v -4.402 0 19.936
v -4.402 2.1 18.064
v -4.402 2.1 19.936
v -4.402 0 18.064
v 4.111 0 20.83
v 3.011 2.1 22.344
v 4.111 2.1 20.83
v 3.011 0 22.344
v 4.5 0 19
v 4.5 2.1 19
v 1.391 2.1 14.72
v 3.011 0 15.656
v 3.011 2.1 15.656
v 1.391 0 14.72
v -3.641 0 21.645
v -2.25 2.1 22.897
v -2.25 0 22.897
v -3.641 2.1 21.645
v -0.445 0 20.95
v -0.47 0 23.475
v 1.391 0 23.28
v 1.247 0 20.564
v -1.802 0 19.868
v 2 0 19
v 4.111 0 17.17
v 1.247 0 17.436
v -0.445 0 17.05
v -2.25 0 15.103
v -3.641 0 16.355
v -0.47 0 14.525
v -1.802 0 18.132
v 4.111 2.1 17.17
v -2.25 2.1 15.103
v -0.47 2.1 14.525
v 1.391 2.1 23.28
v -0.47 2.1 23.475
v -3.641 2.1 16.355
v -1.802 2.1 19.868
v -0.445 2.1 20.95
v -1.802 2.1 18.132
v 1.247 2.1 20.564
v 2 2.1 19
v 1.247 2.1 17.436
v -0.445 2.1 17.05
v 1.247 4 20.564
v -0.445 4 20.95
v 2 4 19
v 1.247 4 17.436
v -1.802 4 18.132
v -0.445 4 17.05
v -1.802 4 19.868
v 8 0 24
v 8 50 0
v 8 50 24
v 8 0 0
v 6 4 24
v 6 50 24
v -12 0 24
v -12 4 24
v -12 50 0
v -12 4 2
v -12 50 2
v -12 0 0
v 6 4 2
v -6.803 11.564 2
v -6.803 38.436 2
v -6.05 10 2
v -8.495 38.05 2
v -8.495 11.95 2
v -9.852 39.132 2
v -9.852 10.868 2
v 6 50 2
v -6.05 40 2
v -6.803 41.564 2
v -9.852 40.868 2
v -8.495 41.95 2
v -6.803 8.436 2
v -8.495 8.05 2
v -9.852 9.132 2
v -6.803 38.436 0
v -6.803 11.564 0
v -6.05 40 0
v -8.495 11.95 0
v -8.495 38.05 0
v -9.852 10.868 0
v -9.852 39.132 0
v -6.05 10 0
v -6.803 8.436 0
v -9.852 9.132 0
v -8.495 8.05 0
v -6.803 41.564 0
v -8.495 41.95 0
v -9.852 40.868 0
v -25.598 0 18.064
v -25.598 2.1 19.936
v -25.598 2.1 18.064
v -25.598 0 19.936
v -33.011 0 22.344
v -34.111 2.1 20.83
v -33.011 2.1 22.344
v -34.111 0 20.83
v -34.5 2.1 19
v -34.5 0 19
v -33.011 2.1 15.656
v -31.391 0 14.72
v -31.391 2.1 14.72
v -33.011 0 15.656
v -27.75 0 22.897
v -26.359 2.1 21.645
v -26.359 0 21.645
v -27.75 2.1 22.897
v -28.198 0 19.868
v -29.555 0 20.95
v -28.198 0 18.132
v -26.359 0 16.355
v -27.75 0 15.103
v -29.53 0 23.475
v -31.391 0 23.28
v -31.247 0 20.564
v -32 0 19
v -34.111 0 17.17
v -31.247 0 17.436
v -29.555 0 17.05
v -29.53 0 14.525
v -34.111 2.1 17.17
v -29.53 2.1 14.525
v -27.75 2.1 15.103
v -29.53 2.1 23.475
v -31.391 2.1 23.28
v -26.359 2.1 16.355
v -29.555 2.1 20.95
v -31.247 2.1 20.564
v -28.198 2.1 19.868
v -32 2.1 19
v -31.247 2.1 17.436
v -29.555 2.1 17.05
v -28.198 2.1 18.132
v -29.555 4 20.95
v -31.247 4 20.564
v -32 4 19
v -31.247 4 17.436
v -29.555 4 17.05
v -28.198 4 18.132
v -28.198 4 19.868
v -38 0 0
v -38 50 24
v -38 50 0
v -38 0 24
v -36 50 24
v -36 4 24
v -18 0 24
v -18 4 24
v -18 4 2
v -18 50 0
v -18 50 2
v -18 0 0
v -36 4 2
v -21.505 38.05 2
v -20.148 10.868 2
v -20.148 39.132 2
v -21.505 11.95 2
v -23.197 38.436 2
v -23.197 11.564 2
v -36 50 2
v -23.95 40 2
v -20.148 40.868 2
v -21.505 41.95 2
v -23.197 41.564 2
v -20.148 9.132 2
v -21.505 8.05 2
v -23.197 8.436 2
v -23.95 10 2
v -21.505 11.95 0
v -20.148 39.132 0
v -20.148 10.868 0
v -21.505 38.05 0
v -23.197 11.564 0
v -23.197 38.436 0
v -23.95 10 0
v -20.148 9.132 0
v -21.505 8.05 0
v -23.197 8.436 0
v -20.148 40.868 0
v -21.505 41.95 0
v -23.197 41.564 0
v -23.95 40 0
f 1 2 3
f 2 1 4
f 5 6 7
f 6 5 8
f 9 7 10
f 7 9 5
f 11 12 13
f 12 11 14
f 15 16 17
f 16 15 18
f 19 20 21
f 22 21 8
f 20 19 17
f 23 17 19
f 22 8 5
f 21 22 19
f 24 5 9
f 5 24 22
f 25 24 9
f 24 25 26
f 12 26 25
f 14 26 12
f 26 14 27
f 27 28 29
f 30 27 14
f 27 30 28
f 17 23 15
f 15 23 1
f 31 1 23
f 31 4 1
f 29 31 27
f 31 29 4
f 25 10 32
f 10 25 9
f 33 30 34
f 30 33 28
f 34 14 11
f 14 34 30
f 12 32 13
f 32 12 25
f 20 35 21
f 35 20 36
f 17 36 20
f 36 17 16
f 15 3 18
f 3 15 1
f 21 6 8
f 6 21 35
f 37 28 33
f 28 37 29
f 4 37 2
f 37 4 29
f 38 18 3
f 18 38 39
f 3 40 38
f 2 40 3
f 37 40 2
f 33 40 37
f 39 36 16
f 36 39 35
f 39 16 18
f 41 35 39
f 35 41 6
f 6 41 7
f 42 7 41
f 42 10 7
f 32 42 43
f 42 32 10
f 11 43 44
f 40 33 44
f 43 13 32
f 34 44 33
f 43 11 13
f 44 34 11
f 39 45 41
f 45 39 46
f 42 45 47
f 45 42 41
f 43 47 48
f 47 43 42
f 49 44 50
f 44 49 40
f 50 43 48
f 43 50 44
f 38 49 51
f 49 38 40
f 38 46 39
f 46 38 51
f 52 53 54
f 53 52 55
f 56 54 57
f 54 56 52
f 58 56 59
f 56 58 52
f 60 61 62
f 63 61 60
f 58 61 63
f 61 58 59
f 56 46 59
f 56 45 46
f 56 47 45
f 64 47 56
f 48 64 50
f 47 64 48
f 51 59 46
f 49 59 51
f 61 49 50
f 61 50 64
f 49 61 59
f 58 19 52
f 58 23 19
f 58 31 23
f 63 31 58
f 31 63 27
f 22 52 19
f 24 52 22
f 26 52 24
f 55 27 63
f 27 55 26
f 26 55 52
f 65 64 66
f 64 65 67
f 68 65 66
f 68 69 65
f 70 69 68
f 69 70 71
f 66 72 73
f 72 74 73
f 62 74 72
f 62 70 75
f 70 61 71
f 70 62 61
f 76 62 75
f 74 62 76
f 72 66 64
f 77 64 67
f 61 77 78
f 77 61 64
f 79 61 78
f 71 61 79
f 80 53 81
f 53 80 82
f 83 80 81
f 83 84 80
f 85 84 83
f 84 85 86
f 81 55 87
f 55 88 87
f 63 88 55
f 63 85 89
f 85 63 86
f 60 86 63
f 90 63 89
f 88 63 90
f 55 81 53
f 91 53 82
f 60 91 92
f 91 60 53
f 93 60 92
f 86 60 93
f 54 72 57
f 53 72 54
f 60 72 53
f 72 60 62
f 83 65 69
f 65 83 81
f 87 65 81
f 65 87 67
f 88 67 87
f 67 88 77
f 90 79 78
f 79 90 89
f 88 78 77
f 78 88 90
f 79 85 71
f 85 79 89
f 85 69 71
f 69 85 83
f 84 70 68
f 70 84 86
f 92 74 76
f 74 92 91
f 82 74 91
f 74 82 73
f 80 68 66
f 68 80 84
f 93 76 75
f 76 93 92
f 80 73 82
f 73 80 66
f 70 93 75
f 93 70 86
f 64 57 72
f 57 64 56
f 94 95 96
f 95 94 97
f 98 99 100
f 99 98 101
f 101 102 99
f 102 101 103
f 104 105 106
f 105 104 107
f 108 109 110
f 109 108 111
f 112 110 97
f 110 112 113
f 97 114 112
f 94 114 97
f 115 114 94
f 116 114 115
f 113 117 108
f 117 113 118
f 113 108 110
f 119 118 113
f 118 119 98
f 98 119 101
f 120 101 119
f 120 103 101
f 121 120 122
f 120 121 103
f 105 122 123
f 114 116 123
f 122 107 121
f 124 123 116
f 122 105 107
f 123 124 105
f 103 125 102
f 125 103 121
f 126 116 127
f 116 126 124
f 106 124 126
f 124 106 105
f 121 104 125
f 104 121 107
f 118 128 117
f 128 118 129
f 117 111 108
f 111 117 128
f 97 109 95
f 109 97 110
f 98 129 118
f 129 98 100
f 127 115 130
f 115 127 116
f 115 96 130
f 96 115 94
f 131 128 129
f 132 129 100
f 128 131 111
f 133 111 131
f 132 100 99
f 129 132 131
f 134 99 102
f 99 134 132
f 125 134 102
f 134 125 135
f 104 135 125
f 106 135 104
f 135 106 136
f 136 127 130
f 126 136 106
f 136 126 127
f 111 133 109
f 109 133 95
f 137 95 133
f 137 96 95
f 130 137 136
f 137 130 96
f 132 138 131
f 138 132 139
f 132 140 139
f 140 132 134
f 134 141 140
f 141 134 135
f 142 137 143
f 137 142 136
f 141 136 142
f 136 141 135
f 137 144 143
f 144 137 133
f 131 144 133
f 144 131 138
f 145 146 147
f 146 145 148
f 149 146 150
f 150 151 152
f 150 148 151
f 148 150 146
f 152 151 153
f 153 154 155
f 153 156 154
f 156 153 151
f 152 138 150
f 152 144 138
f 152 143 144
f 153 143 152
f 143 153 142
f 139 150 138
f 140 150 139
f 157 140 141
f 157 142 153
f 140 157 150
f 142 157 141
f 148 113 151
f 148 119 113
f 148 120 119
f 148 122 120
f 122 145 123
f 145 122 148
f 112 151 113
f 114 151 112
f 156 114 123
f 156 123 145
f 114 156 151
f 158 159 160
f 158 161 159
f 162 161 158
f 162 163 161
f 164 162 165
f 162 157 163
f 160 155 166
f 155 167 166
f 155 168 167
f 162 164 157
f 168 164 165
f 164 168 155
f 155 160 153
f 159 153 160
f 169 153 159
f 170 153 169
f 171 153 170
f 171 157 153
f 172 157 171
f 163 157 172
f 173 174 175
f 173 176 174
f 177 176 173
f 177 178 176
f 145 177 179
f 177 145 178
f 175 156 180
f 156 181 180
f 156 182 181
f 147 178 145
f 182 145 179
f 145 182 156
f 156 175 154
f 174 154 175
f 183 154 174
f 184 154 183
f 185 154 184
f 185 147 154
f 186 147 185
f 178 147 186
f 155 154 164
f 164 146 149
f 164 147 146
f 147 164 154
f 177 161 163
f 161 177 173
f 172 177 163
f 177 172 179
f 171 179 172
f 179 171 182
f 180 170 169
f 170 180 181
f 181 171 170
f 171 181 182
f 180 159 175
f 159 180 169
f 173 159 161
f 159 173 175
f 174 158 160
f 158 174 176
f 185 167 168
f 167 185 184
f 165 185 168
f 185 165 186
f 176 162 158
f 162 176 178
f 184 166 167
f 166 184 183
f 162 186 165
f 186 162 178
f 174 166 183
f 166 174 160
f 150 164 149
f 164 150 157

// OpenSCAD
module arm()
{
//make vertical
translate([-2,2,12.5])
{
	difference()
	{
		cube([20, 4, 23], center=true);		

		translate([2, -0.95, 6.5])
		{
			rotate([90, 0, 0])
			{
				cylinder(r=4.5, h=2.1, center=true);
				cylinder(r=2, h=10, center=true);
			}
		}
	}
}

//make horizontal
translate([-2,25, 1])
{
	difference()
	{
		cube([20, 50, 2], center=true);
		translate([-6.05,-15, 0])
		{
			cylinder(r=2, h=2, center=true);
		}
		translate([-6.05,15, 0])
		{
			cylinder(r=2, h=2, center=true);
		}
	}
}

//make web
translate([7,25,12])
{
	cube([2,50,24], center=true);
}
}

arm();

translate([-30, 0, 0])
{
mirror(v=[1,0,0])
{
	arm();
}
}
